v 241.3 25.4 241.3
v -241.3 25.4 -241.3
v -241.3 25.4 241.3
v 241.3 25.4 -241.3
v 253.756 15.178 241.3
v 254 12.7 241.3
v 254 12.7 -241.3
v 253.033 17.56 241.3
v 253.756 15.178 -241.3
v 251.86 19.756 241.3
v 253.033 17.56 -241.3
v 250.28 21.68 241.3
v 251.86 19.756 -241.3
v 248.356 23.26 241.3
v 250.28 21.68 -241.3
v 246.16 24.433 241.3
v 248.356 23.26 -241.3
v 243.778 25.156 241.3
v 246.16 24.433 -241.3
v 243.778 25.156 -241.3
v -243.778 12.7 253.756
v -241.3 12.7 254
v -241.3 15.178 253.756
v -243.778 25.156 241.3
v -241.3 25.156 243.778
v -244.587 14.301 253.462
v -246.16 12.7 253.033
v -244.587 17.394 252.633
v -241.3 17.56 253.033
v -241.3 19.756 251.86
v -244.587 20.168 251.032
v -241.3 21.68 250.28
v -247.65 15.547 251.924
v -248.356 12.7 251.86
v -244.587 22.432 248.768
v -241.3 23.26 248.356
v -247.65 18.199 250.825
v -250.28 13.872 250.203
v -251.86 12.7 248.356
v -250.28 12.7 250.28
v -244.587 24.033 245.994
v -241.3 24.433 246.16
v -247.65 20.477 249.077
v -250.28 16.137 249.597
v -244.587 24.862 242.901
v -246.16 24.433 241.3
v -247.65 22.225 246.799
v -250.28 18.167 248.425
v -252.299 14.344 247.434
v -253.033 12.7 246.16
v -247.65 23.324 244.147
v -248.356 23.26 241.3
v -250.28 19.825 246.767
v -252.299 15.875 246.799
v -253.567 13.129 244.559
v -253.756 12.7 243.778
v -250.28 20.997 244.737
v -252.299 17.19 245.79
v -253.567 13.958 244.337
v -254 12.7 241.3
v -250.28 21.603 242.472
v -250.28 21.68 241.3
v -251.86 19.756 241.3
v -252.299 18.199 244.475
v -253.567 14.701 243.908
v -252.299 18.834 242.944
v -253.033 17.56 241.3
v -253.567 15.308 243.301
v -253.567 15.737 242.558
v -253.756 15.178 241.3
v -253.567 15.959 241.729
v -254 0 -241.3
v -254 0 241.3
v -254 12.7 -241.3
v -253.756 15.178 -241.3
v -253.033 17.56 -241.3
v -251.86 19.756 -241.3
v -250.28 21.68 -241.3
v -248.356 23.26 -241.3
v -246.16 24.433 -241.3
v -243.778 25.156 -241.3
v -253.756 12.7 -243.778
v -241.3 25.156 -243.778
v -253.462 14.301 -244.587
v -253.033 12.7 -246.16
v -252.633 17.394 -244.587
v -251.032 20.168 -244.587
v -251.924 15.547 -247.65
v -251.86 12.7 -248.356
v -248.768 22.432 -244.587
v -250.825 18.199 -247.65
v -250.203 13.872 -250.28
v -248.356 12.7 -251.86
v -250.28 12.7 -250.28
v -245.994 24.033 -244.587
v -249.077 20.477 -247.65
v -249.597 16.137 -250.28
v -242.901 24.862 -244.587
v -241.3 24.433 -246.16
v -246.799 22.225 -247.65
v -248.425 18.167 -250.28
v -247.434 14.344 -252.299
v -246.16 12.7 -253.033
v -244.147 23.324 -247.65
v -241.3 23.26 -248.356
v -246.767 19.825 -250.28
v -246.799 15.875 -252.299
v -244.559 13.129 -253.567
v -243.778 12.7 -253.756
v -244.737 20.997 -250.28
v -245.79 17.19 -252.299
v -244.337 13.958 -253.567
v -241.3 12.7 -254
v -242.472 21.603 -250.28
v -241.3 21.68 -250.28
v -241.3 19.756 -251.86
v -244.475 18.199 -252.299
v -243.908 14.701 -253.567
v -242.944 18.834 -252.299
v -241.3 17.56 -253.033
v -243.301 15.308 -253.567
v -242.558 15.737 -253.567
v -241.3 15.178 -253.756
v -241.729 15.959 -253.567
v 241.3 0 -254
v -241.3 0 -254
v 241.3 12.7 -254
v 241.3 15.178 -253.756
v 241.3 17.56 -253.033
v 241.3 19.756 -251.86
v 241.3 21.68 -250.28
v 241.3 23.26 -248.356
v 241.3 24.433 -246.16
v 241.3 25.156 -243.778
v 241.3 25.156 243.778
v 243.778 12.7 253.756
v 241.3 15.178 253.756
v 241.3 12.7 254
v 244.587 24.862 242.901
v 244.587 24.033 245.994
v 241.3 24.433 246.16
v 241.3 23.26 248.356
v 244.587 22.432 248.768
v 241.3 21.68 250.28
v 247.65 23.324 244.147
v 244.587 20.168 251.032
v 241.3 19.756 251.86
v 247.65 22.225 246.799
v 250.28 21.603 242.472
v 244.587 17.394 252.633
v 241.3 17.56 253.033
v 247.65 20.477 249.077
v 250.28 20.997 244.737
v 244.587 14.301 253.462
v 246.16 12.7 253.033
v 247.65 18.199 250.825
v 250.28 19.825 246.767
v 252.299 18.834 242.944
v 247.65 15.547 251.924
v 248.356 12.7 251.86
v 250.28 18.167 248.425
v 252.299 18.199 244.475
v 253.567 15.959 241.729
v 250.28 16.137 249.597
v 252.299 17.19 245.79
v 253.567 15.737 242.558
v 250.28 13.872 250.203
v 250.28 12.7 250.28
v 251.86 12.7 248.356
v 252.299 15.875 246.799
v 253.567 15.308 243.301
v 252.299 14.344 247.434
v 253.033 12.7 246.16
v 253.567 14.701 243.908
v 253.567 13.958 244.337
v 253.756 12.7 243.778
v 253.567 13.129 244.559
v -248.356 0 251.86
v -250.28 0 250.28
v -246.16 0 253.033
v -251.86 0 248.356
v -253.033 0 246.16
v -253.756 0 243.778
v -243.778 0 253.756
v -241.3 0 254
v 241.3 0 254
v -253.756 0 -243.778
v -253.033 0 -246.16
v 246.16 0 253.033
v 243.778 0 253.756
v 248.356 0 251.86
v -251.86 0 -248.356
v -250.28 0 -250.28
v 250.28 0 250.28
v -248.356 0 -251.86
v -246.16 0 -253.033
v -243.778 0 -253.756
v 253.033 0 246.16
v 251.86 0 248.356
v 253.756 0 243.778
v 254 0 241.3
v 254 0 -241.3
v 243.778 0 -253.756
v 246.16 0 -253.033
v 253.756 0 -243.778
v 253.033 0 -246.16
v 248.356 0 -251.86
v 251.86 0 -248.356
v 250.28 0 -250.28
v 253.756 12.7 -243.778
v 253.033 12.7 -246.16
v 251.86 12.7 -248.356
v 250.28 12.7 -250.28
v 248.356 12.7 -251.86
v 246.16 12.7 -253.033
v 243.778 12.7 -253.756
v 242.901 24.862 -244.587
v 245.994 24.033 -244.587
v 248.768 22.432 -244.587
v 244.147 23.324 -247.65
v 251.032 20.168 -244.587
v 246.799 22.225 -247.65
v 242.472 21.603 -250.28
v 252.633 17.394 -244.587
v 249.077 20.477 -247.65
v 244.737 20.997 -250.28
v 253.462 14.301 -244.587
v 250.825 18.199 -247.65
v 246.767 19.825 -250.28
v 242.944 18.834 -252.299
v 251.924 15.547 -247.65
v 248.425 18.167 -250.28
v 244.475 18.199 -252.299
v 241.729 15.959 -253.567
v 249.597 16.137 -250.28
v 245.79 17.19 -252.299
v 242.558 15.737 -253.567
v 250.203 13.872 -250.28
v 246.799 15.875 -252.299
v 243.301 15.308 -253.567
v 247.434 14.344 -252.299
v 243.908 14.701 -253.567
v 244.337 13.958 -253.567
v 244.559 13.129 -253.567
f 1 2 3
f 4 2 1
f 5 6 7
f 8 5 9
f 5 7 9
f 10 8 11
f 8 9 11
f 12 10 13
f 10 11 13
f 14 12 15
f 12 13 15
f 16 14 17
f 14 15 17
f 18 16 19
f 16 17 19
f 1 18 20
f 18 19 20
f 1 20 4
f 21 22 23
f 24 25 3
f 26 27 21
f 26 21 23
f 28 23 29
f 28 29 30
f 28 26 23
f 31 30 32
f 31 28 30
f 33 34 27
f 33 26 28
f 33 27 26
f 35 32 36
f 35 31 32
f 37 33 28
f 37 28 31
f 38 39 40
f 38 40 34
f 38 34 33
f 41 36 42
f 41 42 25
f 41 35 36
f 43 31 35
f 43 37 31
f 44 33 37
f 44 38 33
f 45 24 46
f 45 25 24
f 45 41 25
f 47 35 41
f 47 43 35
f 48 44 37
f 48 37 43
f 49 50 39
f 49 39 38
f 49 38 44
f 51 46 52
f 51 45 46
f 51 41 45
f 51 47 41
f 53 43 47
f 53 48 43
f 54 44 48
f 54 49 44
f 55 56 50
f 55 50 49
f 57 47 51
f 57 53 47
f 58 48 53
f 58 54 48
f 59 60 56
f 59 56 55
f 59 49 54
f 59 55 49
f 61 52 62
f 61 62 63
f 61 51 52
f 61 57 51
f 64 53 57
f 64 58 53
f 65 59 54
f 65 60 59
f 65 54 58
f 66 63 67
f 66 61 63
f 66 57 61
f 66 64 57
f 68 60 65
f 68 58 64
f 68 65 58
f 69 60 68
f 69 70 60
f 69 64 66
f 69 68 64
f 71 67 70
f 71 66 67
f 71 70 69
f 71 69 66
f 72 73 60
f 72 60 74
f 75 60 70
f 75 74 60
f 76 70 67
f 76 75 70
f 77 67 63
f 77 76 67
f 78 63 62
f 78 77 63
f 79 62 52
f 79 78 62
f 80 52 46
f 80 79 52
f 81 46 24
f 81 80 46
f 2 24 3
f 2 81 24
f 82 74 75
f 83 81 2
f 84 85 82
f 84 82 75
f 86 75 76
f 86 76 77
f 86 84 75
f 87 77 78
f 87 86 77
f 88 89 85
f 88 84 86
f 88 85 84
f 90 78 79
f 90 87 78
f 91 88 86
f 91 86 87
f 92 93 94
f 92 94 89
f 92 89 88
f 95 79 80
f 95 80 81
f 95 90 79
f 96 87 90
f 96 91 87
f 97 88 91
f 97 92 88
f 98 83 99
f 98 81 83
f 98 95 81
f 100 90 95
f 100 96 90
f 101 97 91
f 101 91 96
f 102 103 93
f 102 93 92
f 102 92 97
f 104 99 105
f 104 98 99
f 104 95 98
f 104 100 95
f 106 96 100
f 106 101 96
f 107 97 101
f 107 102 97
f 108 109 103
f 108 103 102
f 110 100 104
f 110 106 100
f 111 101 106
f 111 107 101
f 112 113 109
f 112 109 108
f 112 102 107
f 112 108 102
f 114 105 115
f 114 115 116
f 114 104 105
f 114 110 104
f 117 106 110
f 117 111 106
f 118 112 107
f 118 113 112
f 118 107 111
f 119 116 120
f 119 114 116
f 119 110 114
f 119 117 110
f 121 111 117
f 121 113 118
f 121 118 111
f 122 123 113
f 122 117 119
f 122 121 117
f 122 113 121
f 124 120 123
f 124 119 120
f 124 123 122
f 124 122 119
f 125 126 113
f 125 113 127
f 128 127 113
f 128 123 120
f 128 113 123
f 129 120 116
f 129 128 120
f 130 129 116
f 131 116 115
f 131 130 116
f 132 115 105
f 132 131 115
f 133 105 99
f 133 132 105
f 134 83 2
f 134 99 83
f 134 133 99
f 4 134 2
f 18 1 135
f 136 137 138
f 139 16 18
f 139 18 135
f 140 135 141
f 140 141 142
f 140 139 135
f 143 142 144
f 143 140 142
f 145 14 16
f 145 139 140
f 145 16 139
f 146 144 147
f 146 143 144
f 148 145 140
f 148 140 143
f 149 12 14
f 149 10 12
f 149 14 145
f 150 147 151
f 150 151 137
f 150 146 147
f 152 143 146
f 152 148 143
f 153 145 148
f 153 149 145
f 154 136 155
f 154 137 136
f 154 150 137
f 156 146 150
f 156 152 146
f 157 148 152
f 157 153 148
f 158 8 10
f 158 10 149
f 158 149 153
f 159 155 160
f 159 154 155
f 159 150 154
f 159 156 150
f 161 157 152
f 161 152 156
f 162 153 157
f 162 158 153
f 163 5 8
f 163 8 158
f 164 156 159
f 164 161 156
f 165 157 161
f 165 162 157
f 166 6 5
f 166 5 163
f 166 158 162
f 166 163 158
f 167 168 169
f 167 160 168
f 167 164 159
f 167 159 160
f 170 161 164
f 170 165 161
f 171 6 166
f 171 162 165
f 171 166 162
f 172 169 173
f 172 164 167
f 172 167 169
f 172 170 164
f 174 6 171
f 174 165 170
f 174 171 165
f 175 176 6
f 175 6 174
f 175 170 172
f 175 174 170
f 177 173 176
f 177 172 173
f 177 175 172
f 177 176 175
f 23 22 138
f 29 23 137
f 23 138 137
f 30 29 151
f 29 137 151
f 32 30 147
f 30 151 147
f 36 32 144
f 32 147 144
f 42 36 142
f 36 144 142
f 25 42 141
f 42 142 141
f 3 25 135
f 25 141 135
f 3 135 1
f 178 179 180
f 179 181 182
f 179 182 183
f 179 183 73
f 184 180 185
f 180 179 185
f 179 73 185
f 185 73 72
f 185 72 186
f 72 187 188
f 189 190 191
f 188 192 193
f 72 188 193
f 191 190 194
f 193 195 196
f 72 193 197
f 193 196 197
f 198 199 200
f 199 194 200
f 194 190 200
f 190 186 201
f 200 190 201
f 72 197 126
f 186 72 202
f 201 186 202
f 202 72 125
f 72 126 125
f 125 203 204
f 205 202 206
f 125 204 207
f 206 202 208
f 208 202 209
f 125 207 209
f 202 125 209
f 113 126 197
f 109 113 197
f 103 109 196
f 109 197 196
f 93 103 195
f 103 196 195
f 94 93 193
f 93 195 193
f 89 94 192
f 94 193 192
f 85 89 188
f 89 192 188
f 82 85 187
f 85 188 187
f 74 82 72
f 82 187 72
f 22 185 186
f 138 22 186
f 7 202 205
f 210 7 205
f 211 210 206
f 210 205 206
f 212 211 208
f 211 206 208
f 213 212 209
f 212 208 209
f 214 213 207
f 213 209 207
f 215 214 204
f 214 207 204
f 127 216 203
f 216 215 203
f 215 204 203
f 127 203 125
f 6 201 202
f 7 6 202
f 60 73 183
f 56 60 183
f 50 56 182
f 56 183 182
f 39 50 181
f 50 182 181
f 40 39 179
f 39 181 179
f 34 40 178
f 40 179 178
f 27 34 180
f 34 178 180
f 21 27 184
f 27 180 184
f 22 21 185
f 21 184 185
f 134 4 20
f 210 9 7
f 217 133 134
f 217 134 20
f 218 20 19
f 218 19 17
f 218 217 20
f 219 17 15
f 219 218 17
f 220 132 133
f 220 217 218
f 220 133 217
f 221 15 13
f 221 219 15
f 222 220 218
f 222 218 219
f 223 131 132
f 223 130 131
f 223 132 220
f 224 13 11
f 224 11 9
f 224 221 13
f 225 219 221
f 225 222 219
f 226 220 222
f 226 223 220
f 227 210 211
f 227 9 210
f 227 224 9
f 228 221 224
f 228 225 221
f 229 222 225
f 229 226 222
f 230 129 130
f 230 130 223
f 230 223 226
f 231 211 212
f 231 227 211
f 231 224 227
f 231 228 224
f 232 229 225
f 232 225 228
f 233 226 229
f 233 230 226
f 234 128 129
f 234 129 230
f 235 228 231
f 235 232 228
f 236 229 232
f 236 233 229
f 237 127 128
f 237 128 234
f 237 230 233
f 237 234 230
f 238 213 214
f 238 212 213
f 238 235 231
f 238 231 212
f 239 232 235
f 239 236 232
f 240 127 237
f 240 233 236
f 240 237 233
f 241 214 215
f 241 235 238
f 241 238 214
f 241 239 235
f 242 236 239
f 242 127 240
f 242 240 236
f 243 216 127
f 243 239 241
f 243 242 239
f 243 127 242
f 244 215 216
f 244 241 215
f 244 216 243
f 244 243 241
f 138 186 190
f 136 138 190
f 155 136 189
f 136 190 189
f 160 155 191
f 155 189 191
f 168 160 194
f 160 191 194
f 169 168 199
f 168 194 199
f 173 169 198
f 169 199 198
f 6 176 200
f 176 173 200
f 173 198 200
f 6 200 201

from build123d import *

# Parameters (mm, degrees)
SKETCH1_W           = 508
SKETCH1_H           = 508
BOSS_EXTRUDE1_DEPTH = 25.4
FILLET1_R           = 12.7
FILLET2_R           = 12.7


with BuildPart() as part:
    # Sketch1 → Boss-Extrude1 (new body)
    with BuildSketch(Plane(origin=(0, 0, 0), x_dir=(1, 0, 0), z_dir=(0, 1, 0))):
        Rectangle(SKETCH1_W, SKETCH1_H)
    extrude(amount=BOSS_EXTRUDE1_DEPTH)

    # Fillet1
    fillet1_edges = [part.edges().sort_by_distance(p)[0] for p in [
        (-254, 25.4, 0),
        (0, 25.4, 254),
        (254, 25.4, 0),
        (0, 25.4, -254),
    ]]
    fillet(fillet1_edges, radius=FILLET1_R)

    # Fillet2
    # the kernel refuses this fillet: 12.7 mm, written as the material it takes off along each edge
    with BuildSketch(Plane(origin=(241.3, 12.7, 241.3), x_dir=(0, 0, 1), z_dir=(1, 0, 0))) as fillet2_piece_1_section:
        Polygon((0, 0), (FILLET2_R, 0), (FILLET2_R, -FILLET2_R), (0, -FILLET2_R), align=None)
    fillet2_piece_1 = extrude(amount=FILLET2_R, mode=Mode.PRIVATE)
    fillet2_piece_1 = fillet2_piece_1 - Plane(origin=(241.3, 12.7, 241.3), x_dir=(0, -0.7071067811865475, -0.7071067811865475), z_dir=(1, 0, 0)) * Sphere(FILLET2_R, mode=Mode.PRIVATE)
    add(fillet2_piece_1, mode=Mode.SUBTRACT)
    with BuildSketch(Plane(origin=(-241.3, 12.7, 241.3), x_dir=(0, 0, 1), z_dir=(-1, 0, 0))) as fillet2_piece_2_section:
        Polygon((0, 0), (FILLET2_R, 0), (FILLET2_R, FILLET2_R), (0, FILLET2_R), align=None)
    fillet2_piece_2 = extrude(amount=FILLET2_R, mode=Mode.PRIVATE)
    fillet2_piece_2 = fillet2_piece_2 - Plane(origin=(-241.3, 12.7, 241.3), x_dir=(0, -0.7071067811865475, -0.7071067811865475), z_dir=(-1, 0, 0)) * Sphere(FILLET2_R, mode=Mode.PRIVATE)
    add(fillet2_piece_2, mode=Mode.SUBTRACT)
    with BuildSketch(Plane(origin=(241.3, 12.7, -241.3), x_dir=(1, 0, 0), z_dir=(0, 0, -1))) as fillet2_piece_3_section:
        Polygon((0, 0), (FILLET2_R, 0), (FILLET2_R, -FILLET2_R), (0, -FILLET2_R), align=None)
    fillet2_piece_3 = extrude(amount=FILLET2_R, mode=Mode.PRIVATE)
    fillet2_piece_3 = fillet2_piece_3 - Plane(origin=(241.3, 12.7, -241.3), x_dir=(-0.7071067811865475, -0.7071067811865475, 0), z_dir=(0, 0, -1)) * Sphere(FILLET2_R, mode=Mode.PRIVATE)
    add(fillet2_piece_3, mode=Mode.SUBTRACT)
    with BuildSketch(Plane(origin=(-241.3, 12.7, -241.3), x_dir=(-1, 0, 0), z_dir=(0, 0, -1))) as fillet2_piece_4_section:
        Polygon((0, 0), (FILLET2_R, 0), (FILLET2_R, FILLET2_R), (0, FILLET2_R), align=None)
    fillet2_piece_4 = extrude(amount=FILLET2_R, mode=Mode.PRIVATE)
    fillet2_piece_4 = fillet2_piece_4 - Plane(origin=(-241.3, 12.7, -241.3), x_dir=(0.7071067811865475, -0.7071067811865475, 0), z_dir=(0, 0, -1)) * Sphere(FILLET2_R, mode=Mode.PRIVATE)
    add(fillet2_piece_4, mode=Mode.SUBTRACT)
    with BuildSketch(Plane(origin=(-254, -31.75, -254), x_dir=(1, 0, 0), z_dir=(0, 1, 0)), Plane(origin=(-254, -31.75, 254), x_dir=(0, 0, -1), z_dir=(0, 1, 0))) as fillet2_piece_5:
        with BuildLine():
            CenterArc((FILLET2_R, -FILLET2_R), FILLET2_R, 90, 90)
            Line((0, -FILLET2_R), (0, 0))
            Line((0, 0), (FILLET2_R, 0))
        make_face()
    extrude(amount=44.45, mode=Mode.SUBTRACT)
    with BuildSketch(Plane(origin=(254, -31.75, -254), x_dir=(-1, 0, 0), z_dir=(0, 1, 0)), Plane(origin=(254, -31.75, 254), x_dir=(0, 0, -1), z_dir=(0, 1, 0))) as fillet2_piece_6:
        with BuildLine():
            CenterArc((FILLET2_R, FILLET2_R), FILLET2_R, 180, 90)
            Line((0, FILLET2_R), (0, 0))
            Line((0, 0), (FILLET2_R, 0))
        make_face()
    extrude(amount=44.45, mode=Mode.SUBTRACT)


solid = part.part
